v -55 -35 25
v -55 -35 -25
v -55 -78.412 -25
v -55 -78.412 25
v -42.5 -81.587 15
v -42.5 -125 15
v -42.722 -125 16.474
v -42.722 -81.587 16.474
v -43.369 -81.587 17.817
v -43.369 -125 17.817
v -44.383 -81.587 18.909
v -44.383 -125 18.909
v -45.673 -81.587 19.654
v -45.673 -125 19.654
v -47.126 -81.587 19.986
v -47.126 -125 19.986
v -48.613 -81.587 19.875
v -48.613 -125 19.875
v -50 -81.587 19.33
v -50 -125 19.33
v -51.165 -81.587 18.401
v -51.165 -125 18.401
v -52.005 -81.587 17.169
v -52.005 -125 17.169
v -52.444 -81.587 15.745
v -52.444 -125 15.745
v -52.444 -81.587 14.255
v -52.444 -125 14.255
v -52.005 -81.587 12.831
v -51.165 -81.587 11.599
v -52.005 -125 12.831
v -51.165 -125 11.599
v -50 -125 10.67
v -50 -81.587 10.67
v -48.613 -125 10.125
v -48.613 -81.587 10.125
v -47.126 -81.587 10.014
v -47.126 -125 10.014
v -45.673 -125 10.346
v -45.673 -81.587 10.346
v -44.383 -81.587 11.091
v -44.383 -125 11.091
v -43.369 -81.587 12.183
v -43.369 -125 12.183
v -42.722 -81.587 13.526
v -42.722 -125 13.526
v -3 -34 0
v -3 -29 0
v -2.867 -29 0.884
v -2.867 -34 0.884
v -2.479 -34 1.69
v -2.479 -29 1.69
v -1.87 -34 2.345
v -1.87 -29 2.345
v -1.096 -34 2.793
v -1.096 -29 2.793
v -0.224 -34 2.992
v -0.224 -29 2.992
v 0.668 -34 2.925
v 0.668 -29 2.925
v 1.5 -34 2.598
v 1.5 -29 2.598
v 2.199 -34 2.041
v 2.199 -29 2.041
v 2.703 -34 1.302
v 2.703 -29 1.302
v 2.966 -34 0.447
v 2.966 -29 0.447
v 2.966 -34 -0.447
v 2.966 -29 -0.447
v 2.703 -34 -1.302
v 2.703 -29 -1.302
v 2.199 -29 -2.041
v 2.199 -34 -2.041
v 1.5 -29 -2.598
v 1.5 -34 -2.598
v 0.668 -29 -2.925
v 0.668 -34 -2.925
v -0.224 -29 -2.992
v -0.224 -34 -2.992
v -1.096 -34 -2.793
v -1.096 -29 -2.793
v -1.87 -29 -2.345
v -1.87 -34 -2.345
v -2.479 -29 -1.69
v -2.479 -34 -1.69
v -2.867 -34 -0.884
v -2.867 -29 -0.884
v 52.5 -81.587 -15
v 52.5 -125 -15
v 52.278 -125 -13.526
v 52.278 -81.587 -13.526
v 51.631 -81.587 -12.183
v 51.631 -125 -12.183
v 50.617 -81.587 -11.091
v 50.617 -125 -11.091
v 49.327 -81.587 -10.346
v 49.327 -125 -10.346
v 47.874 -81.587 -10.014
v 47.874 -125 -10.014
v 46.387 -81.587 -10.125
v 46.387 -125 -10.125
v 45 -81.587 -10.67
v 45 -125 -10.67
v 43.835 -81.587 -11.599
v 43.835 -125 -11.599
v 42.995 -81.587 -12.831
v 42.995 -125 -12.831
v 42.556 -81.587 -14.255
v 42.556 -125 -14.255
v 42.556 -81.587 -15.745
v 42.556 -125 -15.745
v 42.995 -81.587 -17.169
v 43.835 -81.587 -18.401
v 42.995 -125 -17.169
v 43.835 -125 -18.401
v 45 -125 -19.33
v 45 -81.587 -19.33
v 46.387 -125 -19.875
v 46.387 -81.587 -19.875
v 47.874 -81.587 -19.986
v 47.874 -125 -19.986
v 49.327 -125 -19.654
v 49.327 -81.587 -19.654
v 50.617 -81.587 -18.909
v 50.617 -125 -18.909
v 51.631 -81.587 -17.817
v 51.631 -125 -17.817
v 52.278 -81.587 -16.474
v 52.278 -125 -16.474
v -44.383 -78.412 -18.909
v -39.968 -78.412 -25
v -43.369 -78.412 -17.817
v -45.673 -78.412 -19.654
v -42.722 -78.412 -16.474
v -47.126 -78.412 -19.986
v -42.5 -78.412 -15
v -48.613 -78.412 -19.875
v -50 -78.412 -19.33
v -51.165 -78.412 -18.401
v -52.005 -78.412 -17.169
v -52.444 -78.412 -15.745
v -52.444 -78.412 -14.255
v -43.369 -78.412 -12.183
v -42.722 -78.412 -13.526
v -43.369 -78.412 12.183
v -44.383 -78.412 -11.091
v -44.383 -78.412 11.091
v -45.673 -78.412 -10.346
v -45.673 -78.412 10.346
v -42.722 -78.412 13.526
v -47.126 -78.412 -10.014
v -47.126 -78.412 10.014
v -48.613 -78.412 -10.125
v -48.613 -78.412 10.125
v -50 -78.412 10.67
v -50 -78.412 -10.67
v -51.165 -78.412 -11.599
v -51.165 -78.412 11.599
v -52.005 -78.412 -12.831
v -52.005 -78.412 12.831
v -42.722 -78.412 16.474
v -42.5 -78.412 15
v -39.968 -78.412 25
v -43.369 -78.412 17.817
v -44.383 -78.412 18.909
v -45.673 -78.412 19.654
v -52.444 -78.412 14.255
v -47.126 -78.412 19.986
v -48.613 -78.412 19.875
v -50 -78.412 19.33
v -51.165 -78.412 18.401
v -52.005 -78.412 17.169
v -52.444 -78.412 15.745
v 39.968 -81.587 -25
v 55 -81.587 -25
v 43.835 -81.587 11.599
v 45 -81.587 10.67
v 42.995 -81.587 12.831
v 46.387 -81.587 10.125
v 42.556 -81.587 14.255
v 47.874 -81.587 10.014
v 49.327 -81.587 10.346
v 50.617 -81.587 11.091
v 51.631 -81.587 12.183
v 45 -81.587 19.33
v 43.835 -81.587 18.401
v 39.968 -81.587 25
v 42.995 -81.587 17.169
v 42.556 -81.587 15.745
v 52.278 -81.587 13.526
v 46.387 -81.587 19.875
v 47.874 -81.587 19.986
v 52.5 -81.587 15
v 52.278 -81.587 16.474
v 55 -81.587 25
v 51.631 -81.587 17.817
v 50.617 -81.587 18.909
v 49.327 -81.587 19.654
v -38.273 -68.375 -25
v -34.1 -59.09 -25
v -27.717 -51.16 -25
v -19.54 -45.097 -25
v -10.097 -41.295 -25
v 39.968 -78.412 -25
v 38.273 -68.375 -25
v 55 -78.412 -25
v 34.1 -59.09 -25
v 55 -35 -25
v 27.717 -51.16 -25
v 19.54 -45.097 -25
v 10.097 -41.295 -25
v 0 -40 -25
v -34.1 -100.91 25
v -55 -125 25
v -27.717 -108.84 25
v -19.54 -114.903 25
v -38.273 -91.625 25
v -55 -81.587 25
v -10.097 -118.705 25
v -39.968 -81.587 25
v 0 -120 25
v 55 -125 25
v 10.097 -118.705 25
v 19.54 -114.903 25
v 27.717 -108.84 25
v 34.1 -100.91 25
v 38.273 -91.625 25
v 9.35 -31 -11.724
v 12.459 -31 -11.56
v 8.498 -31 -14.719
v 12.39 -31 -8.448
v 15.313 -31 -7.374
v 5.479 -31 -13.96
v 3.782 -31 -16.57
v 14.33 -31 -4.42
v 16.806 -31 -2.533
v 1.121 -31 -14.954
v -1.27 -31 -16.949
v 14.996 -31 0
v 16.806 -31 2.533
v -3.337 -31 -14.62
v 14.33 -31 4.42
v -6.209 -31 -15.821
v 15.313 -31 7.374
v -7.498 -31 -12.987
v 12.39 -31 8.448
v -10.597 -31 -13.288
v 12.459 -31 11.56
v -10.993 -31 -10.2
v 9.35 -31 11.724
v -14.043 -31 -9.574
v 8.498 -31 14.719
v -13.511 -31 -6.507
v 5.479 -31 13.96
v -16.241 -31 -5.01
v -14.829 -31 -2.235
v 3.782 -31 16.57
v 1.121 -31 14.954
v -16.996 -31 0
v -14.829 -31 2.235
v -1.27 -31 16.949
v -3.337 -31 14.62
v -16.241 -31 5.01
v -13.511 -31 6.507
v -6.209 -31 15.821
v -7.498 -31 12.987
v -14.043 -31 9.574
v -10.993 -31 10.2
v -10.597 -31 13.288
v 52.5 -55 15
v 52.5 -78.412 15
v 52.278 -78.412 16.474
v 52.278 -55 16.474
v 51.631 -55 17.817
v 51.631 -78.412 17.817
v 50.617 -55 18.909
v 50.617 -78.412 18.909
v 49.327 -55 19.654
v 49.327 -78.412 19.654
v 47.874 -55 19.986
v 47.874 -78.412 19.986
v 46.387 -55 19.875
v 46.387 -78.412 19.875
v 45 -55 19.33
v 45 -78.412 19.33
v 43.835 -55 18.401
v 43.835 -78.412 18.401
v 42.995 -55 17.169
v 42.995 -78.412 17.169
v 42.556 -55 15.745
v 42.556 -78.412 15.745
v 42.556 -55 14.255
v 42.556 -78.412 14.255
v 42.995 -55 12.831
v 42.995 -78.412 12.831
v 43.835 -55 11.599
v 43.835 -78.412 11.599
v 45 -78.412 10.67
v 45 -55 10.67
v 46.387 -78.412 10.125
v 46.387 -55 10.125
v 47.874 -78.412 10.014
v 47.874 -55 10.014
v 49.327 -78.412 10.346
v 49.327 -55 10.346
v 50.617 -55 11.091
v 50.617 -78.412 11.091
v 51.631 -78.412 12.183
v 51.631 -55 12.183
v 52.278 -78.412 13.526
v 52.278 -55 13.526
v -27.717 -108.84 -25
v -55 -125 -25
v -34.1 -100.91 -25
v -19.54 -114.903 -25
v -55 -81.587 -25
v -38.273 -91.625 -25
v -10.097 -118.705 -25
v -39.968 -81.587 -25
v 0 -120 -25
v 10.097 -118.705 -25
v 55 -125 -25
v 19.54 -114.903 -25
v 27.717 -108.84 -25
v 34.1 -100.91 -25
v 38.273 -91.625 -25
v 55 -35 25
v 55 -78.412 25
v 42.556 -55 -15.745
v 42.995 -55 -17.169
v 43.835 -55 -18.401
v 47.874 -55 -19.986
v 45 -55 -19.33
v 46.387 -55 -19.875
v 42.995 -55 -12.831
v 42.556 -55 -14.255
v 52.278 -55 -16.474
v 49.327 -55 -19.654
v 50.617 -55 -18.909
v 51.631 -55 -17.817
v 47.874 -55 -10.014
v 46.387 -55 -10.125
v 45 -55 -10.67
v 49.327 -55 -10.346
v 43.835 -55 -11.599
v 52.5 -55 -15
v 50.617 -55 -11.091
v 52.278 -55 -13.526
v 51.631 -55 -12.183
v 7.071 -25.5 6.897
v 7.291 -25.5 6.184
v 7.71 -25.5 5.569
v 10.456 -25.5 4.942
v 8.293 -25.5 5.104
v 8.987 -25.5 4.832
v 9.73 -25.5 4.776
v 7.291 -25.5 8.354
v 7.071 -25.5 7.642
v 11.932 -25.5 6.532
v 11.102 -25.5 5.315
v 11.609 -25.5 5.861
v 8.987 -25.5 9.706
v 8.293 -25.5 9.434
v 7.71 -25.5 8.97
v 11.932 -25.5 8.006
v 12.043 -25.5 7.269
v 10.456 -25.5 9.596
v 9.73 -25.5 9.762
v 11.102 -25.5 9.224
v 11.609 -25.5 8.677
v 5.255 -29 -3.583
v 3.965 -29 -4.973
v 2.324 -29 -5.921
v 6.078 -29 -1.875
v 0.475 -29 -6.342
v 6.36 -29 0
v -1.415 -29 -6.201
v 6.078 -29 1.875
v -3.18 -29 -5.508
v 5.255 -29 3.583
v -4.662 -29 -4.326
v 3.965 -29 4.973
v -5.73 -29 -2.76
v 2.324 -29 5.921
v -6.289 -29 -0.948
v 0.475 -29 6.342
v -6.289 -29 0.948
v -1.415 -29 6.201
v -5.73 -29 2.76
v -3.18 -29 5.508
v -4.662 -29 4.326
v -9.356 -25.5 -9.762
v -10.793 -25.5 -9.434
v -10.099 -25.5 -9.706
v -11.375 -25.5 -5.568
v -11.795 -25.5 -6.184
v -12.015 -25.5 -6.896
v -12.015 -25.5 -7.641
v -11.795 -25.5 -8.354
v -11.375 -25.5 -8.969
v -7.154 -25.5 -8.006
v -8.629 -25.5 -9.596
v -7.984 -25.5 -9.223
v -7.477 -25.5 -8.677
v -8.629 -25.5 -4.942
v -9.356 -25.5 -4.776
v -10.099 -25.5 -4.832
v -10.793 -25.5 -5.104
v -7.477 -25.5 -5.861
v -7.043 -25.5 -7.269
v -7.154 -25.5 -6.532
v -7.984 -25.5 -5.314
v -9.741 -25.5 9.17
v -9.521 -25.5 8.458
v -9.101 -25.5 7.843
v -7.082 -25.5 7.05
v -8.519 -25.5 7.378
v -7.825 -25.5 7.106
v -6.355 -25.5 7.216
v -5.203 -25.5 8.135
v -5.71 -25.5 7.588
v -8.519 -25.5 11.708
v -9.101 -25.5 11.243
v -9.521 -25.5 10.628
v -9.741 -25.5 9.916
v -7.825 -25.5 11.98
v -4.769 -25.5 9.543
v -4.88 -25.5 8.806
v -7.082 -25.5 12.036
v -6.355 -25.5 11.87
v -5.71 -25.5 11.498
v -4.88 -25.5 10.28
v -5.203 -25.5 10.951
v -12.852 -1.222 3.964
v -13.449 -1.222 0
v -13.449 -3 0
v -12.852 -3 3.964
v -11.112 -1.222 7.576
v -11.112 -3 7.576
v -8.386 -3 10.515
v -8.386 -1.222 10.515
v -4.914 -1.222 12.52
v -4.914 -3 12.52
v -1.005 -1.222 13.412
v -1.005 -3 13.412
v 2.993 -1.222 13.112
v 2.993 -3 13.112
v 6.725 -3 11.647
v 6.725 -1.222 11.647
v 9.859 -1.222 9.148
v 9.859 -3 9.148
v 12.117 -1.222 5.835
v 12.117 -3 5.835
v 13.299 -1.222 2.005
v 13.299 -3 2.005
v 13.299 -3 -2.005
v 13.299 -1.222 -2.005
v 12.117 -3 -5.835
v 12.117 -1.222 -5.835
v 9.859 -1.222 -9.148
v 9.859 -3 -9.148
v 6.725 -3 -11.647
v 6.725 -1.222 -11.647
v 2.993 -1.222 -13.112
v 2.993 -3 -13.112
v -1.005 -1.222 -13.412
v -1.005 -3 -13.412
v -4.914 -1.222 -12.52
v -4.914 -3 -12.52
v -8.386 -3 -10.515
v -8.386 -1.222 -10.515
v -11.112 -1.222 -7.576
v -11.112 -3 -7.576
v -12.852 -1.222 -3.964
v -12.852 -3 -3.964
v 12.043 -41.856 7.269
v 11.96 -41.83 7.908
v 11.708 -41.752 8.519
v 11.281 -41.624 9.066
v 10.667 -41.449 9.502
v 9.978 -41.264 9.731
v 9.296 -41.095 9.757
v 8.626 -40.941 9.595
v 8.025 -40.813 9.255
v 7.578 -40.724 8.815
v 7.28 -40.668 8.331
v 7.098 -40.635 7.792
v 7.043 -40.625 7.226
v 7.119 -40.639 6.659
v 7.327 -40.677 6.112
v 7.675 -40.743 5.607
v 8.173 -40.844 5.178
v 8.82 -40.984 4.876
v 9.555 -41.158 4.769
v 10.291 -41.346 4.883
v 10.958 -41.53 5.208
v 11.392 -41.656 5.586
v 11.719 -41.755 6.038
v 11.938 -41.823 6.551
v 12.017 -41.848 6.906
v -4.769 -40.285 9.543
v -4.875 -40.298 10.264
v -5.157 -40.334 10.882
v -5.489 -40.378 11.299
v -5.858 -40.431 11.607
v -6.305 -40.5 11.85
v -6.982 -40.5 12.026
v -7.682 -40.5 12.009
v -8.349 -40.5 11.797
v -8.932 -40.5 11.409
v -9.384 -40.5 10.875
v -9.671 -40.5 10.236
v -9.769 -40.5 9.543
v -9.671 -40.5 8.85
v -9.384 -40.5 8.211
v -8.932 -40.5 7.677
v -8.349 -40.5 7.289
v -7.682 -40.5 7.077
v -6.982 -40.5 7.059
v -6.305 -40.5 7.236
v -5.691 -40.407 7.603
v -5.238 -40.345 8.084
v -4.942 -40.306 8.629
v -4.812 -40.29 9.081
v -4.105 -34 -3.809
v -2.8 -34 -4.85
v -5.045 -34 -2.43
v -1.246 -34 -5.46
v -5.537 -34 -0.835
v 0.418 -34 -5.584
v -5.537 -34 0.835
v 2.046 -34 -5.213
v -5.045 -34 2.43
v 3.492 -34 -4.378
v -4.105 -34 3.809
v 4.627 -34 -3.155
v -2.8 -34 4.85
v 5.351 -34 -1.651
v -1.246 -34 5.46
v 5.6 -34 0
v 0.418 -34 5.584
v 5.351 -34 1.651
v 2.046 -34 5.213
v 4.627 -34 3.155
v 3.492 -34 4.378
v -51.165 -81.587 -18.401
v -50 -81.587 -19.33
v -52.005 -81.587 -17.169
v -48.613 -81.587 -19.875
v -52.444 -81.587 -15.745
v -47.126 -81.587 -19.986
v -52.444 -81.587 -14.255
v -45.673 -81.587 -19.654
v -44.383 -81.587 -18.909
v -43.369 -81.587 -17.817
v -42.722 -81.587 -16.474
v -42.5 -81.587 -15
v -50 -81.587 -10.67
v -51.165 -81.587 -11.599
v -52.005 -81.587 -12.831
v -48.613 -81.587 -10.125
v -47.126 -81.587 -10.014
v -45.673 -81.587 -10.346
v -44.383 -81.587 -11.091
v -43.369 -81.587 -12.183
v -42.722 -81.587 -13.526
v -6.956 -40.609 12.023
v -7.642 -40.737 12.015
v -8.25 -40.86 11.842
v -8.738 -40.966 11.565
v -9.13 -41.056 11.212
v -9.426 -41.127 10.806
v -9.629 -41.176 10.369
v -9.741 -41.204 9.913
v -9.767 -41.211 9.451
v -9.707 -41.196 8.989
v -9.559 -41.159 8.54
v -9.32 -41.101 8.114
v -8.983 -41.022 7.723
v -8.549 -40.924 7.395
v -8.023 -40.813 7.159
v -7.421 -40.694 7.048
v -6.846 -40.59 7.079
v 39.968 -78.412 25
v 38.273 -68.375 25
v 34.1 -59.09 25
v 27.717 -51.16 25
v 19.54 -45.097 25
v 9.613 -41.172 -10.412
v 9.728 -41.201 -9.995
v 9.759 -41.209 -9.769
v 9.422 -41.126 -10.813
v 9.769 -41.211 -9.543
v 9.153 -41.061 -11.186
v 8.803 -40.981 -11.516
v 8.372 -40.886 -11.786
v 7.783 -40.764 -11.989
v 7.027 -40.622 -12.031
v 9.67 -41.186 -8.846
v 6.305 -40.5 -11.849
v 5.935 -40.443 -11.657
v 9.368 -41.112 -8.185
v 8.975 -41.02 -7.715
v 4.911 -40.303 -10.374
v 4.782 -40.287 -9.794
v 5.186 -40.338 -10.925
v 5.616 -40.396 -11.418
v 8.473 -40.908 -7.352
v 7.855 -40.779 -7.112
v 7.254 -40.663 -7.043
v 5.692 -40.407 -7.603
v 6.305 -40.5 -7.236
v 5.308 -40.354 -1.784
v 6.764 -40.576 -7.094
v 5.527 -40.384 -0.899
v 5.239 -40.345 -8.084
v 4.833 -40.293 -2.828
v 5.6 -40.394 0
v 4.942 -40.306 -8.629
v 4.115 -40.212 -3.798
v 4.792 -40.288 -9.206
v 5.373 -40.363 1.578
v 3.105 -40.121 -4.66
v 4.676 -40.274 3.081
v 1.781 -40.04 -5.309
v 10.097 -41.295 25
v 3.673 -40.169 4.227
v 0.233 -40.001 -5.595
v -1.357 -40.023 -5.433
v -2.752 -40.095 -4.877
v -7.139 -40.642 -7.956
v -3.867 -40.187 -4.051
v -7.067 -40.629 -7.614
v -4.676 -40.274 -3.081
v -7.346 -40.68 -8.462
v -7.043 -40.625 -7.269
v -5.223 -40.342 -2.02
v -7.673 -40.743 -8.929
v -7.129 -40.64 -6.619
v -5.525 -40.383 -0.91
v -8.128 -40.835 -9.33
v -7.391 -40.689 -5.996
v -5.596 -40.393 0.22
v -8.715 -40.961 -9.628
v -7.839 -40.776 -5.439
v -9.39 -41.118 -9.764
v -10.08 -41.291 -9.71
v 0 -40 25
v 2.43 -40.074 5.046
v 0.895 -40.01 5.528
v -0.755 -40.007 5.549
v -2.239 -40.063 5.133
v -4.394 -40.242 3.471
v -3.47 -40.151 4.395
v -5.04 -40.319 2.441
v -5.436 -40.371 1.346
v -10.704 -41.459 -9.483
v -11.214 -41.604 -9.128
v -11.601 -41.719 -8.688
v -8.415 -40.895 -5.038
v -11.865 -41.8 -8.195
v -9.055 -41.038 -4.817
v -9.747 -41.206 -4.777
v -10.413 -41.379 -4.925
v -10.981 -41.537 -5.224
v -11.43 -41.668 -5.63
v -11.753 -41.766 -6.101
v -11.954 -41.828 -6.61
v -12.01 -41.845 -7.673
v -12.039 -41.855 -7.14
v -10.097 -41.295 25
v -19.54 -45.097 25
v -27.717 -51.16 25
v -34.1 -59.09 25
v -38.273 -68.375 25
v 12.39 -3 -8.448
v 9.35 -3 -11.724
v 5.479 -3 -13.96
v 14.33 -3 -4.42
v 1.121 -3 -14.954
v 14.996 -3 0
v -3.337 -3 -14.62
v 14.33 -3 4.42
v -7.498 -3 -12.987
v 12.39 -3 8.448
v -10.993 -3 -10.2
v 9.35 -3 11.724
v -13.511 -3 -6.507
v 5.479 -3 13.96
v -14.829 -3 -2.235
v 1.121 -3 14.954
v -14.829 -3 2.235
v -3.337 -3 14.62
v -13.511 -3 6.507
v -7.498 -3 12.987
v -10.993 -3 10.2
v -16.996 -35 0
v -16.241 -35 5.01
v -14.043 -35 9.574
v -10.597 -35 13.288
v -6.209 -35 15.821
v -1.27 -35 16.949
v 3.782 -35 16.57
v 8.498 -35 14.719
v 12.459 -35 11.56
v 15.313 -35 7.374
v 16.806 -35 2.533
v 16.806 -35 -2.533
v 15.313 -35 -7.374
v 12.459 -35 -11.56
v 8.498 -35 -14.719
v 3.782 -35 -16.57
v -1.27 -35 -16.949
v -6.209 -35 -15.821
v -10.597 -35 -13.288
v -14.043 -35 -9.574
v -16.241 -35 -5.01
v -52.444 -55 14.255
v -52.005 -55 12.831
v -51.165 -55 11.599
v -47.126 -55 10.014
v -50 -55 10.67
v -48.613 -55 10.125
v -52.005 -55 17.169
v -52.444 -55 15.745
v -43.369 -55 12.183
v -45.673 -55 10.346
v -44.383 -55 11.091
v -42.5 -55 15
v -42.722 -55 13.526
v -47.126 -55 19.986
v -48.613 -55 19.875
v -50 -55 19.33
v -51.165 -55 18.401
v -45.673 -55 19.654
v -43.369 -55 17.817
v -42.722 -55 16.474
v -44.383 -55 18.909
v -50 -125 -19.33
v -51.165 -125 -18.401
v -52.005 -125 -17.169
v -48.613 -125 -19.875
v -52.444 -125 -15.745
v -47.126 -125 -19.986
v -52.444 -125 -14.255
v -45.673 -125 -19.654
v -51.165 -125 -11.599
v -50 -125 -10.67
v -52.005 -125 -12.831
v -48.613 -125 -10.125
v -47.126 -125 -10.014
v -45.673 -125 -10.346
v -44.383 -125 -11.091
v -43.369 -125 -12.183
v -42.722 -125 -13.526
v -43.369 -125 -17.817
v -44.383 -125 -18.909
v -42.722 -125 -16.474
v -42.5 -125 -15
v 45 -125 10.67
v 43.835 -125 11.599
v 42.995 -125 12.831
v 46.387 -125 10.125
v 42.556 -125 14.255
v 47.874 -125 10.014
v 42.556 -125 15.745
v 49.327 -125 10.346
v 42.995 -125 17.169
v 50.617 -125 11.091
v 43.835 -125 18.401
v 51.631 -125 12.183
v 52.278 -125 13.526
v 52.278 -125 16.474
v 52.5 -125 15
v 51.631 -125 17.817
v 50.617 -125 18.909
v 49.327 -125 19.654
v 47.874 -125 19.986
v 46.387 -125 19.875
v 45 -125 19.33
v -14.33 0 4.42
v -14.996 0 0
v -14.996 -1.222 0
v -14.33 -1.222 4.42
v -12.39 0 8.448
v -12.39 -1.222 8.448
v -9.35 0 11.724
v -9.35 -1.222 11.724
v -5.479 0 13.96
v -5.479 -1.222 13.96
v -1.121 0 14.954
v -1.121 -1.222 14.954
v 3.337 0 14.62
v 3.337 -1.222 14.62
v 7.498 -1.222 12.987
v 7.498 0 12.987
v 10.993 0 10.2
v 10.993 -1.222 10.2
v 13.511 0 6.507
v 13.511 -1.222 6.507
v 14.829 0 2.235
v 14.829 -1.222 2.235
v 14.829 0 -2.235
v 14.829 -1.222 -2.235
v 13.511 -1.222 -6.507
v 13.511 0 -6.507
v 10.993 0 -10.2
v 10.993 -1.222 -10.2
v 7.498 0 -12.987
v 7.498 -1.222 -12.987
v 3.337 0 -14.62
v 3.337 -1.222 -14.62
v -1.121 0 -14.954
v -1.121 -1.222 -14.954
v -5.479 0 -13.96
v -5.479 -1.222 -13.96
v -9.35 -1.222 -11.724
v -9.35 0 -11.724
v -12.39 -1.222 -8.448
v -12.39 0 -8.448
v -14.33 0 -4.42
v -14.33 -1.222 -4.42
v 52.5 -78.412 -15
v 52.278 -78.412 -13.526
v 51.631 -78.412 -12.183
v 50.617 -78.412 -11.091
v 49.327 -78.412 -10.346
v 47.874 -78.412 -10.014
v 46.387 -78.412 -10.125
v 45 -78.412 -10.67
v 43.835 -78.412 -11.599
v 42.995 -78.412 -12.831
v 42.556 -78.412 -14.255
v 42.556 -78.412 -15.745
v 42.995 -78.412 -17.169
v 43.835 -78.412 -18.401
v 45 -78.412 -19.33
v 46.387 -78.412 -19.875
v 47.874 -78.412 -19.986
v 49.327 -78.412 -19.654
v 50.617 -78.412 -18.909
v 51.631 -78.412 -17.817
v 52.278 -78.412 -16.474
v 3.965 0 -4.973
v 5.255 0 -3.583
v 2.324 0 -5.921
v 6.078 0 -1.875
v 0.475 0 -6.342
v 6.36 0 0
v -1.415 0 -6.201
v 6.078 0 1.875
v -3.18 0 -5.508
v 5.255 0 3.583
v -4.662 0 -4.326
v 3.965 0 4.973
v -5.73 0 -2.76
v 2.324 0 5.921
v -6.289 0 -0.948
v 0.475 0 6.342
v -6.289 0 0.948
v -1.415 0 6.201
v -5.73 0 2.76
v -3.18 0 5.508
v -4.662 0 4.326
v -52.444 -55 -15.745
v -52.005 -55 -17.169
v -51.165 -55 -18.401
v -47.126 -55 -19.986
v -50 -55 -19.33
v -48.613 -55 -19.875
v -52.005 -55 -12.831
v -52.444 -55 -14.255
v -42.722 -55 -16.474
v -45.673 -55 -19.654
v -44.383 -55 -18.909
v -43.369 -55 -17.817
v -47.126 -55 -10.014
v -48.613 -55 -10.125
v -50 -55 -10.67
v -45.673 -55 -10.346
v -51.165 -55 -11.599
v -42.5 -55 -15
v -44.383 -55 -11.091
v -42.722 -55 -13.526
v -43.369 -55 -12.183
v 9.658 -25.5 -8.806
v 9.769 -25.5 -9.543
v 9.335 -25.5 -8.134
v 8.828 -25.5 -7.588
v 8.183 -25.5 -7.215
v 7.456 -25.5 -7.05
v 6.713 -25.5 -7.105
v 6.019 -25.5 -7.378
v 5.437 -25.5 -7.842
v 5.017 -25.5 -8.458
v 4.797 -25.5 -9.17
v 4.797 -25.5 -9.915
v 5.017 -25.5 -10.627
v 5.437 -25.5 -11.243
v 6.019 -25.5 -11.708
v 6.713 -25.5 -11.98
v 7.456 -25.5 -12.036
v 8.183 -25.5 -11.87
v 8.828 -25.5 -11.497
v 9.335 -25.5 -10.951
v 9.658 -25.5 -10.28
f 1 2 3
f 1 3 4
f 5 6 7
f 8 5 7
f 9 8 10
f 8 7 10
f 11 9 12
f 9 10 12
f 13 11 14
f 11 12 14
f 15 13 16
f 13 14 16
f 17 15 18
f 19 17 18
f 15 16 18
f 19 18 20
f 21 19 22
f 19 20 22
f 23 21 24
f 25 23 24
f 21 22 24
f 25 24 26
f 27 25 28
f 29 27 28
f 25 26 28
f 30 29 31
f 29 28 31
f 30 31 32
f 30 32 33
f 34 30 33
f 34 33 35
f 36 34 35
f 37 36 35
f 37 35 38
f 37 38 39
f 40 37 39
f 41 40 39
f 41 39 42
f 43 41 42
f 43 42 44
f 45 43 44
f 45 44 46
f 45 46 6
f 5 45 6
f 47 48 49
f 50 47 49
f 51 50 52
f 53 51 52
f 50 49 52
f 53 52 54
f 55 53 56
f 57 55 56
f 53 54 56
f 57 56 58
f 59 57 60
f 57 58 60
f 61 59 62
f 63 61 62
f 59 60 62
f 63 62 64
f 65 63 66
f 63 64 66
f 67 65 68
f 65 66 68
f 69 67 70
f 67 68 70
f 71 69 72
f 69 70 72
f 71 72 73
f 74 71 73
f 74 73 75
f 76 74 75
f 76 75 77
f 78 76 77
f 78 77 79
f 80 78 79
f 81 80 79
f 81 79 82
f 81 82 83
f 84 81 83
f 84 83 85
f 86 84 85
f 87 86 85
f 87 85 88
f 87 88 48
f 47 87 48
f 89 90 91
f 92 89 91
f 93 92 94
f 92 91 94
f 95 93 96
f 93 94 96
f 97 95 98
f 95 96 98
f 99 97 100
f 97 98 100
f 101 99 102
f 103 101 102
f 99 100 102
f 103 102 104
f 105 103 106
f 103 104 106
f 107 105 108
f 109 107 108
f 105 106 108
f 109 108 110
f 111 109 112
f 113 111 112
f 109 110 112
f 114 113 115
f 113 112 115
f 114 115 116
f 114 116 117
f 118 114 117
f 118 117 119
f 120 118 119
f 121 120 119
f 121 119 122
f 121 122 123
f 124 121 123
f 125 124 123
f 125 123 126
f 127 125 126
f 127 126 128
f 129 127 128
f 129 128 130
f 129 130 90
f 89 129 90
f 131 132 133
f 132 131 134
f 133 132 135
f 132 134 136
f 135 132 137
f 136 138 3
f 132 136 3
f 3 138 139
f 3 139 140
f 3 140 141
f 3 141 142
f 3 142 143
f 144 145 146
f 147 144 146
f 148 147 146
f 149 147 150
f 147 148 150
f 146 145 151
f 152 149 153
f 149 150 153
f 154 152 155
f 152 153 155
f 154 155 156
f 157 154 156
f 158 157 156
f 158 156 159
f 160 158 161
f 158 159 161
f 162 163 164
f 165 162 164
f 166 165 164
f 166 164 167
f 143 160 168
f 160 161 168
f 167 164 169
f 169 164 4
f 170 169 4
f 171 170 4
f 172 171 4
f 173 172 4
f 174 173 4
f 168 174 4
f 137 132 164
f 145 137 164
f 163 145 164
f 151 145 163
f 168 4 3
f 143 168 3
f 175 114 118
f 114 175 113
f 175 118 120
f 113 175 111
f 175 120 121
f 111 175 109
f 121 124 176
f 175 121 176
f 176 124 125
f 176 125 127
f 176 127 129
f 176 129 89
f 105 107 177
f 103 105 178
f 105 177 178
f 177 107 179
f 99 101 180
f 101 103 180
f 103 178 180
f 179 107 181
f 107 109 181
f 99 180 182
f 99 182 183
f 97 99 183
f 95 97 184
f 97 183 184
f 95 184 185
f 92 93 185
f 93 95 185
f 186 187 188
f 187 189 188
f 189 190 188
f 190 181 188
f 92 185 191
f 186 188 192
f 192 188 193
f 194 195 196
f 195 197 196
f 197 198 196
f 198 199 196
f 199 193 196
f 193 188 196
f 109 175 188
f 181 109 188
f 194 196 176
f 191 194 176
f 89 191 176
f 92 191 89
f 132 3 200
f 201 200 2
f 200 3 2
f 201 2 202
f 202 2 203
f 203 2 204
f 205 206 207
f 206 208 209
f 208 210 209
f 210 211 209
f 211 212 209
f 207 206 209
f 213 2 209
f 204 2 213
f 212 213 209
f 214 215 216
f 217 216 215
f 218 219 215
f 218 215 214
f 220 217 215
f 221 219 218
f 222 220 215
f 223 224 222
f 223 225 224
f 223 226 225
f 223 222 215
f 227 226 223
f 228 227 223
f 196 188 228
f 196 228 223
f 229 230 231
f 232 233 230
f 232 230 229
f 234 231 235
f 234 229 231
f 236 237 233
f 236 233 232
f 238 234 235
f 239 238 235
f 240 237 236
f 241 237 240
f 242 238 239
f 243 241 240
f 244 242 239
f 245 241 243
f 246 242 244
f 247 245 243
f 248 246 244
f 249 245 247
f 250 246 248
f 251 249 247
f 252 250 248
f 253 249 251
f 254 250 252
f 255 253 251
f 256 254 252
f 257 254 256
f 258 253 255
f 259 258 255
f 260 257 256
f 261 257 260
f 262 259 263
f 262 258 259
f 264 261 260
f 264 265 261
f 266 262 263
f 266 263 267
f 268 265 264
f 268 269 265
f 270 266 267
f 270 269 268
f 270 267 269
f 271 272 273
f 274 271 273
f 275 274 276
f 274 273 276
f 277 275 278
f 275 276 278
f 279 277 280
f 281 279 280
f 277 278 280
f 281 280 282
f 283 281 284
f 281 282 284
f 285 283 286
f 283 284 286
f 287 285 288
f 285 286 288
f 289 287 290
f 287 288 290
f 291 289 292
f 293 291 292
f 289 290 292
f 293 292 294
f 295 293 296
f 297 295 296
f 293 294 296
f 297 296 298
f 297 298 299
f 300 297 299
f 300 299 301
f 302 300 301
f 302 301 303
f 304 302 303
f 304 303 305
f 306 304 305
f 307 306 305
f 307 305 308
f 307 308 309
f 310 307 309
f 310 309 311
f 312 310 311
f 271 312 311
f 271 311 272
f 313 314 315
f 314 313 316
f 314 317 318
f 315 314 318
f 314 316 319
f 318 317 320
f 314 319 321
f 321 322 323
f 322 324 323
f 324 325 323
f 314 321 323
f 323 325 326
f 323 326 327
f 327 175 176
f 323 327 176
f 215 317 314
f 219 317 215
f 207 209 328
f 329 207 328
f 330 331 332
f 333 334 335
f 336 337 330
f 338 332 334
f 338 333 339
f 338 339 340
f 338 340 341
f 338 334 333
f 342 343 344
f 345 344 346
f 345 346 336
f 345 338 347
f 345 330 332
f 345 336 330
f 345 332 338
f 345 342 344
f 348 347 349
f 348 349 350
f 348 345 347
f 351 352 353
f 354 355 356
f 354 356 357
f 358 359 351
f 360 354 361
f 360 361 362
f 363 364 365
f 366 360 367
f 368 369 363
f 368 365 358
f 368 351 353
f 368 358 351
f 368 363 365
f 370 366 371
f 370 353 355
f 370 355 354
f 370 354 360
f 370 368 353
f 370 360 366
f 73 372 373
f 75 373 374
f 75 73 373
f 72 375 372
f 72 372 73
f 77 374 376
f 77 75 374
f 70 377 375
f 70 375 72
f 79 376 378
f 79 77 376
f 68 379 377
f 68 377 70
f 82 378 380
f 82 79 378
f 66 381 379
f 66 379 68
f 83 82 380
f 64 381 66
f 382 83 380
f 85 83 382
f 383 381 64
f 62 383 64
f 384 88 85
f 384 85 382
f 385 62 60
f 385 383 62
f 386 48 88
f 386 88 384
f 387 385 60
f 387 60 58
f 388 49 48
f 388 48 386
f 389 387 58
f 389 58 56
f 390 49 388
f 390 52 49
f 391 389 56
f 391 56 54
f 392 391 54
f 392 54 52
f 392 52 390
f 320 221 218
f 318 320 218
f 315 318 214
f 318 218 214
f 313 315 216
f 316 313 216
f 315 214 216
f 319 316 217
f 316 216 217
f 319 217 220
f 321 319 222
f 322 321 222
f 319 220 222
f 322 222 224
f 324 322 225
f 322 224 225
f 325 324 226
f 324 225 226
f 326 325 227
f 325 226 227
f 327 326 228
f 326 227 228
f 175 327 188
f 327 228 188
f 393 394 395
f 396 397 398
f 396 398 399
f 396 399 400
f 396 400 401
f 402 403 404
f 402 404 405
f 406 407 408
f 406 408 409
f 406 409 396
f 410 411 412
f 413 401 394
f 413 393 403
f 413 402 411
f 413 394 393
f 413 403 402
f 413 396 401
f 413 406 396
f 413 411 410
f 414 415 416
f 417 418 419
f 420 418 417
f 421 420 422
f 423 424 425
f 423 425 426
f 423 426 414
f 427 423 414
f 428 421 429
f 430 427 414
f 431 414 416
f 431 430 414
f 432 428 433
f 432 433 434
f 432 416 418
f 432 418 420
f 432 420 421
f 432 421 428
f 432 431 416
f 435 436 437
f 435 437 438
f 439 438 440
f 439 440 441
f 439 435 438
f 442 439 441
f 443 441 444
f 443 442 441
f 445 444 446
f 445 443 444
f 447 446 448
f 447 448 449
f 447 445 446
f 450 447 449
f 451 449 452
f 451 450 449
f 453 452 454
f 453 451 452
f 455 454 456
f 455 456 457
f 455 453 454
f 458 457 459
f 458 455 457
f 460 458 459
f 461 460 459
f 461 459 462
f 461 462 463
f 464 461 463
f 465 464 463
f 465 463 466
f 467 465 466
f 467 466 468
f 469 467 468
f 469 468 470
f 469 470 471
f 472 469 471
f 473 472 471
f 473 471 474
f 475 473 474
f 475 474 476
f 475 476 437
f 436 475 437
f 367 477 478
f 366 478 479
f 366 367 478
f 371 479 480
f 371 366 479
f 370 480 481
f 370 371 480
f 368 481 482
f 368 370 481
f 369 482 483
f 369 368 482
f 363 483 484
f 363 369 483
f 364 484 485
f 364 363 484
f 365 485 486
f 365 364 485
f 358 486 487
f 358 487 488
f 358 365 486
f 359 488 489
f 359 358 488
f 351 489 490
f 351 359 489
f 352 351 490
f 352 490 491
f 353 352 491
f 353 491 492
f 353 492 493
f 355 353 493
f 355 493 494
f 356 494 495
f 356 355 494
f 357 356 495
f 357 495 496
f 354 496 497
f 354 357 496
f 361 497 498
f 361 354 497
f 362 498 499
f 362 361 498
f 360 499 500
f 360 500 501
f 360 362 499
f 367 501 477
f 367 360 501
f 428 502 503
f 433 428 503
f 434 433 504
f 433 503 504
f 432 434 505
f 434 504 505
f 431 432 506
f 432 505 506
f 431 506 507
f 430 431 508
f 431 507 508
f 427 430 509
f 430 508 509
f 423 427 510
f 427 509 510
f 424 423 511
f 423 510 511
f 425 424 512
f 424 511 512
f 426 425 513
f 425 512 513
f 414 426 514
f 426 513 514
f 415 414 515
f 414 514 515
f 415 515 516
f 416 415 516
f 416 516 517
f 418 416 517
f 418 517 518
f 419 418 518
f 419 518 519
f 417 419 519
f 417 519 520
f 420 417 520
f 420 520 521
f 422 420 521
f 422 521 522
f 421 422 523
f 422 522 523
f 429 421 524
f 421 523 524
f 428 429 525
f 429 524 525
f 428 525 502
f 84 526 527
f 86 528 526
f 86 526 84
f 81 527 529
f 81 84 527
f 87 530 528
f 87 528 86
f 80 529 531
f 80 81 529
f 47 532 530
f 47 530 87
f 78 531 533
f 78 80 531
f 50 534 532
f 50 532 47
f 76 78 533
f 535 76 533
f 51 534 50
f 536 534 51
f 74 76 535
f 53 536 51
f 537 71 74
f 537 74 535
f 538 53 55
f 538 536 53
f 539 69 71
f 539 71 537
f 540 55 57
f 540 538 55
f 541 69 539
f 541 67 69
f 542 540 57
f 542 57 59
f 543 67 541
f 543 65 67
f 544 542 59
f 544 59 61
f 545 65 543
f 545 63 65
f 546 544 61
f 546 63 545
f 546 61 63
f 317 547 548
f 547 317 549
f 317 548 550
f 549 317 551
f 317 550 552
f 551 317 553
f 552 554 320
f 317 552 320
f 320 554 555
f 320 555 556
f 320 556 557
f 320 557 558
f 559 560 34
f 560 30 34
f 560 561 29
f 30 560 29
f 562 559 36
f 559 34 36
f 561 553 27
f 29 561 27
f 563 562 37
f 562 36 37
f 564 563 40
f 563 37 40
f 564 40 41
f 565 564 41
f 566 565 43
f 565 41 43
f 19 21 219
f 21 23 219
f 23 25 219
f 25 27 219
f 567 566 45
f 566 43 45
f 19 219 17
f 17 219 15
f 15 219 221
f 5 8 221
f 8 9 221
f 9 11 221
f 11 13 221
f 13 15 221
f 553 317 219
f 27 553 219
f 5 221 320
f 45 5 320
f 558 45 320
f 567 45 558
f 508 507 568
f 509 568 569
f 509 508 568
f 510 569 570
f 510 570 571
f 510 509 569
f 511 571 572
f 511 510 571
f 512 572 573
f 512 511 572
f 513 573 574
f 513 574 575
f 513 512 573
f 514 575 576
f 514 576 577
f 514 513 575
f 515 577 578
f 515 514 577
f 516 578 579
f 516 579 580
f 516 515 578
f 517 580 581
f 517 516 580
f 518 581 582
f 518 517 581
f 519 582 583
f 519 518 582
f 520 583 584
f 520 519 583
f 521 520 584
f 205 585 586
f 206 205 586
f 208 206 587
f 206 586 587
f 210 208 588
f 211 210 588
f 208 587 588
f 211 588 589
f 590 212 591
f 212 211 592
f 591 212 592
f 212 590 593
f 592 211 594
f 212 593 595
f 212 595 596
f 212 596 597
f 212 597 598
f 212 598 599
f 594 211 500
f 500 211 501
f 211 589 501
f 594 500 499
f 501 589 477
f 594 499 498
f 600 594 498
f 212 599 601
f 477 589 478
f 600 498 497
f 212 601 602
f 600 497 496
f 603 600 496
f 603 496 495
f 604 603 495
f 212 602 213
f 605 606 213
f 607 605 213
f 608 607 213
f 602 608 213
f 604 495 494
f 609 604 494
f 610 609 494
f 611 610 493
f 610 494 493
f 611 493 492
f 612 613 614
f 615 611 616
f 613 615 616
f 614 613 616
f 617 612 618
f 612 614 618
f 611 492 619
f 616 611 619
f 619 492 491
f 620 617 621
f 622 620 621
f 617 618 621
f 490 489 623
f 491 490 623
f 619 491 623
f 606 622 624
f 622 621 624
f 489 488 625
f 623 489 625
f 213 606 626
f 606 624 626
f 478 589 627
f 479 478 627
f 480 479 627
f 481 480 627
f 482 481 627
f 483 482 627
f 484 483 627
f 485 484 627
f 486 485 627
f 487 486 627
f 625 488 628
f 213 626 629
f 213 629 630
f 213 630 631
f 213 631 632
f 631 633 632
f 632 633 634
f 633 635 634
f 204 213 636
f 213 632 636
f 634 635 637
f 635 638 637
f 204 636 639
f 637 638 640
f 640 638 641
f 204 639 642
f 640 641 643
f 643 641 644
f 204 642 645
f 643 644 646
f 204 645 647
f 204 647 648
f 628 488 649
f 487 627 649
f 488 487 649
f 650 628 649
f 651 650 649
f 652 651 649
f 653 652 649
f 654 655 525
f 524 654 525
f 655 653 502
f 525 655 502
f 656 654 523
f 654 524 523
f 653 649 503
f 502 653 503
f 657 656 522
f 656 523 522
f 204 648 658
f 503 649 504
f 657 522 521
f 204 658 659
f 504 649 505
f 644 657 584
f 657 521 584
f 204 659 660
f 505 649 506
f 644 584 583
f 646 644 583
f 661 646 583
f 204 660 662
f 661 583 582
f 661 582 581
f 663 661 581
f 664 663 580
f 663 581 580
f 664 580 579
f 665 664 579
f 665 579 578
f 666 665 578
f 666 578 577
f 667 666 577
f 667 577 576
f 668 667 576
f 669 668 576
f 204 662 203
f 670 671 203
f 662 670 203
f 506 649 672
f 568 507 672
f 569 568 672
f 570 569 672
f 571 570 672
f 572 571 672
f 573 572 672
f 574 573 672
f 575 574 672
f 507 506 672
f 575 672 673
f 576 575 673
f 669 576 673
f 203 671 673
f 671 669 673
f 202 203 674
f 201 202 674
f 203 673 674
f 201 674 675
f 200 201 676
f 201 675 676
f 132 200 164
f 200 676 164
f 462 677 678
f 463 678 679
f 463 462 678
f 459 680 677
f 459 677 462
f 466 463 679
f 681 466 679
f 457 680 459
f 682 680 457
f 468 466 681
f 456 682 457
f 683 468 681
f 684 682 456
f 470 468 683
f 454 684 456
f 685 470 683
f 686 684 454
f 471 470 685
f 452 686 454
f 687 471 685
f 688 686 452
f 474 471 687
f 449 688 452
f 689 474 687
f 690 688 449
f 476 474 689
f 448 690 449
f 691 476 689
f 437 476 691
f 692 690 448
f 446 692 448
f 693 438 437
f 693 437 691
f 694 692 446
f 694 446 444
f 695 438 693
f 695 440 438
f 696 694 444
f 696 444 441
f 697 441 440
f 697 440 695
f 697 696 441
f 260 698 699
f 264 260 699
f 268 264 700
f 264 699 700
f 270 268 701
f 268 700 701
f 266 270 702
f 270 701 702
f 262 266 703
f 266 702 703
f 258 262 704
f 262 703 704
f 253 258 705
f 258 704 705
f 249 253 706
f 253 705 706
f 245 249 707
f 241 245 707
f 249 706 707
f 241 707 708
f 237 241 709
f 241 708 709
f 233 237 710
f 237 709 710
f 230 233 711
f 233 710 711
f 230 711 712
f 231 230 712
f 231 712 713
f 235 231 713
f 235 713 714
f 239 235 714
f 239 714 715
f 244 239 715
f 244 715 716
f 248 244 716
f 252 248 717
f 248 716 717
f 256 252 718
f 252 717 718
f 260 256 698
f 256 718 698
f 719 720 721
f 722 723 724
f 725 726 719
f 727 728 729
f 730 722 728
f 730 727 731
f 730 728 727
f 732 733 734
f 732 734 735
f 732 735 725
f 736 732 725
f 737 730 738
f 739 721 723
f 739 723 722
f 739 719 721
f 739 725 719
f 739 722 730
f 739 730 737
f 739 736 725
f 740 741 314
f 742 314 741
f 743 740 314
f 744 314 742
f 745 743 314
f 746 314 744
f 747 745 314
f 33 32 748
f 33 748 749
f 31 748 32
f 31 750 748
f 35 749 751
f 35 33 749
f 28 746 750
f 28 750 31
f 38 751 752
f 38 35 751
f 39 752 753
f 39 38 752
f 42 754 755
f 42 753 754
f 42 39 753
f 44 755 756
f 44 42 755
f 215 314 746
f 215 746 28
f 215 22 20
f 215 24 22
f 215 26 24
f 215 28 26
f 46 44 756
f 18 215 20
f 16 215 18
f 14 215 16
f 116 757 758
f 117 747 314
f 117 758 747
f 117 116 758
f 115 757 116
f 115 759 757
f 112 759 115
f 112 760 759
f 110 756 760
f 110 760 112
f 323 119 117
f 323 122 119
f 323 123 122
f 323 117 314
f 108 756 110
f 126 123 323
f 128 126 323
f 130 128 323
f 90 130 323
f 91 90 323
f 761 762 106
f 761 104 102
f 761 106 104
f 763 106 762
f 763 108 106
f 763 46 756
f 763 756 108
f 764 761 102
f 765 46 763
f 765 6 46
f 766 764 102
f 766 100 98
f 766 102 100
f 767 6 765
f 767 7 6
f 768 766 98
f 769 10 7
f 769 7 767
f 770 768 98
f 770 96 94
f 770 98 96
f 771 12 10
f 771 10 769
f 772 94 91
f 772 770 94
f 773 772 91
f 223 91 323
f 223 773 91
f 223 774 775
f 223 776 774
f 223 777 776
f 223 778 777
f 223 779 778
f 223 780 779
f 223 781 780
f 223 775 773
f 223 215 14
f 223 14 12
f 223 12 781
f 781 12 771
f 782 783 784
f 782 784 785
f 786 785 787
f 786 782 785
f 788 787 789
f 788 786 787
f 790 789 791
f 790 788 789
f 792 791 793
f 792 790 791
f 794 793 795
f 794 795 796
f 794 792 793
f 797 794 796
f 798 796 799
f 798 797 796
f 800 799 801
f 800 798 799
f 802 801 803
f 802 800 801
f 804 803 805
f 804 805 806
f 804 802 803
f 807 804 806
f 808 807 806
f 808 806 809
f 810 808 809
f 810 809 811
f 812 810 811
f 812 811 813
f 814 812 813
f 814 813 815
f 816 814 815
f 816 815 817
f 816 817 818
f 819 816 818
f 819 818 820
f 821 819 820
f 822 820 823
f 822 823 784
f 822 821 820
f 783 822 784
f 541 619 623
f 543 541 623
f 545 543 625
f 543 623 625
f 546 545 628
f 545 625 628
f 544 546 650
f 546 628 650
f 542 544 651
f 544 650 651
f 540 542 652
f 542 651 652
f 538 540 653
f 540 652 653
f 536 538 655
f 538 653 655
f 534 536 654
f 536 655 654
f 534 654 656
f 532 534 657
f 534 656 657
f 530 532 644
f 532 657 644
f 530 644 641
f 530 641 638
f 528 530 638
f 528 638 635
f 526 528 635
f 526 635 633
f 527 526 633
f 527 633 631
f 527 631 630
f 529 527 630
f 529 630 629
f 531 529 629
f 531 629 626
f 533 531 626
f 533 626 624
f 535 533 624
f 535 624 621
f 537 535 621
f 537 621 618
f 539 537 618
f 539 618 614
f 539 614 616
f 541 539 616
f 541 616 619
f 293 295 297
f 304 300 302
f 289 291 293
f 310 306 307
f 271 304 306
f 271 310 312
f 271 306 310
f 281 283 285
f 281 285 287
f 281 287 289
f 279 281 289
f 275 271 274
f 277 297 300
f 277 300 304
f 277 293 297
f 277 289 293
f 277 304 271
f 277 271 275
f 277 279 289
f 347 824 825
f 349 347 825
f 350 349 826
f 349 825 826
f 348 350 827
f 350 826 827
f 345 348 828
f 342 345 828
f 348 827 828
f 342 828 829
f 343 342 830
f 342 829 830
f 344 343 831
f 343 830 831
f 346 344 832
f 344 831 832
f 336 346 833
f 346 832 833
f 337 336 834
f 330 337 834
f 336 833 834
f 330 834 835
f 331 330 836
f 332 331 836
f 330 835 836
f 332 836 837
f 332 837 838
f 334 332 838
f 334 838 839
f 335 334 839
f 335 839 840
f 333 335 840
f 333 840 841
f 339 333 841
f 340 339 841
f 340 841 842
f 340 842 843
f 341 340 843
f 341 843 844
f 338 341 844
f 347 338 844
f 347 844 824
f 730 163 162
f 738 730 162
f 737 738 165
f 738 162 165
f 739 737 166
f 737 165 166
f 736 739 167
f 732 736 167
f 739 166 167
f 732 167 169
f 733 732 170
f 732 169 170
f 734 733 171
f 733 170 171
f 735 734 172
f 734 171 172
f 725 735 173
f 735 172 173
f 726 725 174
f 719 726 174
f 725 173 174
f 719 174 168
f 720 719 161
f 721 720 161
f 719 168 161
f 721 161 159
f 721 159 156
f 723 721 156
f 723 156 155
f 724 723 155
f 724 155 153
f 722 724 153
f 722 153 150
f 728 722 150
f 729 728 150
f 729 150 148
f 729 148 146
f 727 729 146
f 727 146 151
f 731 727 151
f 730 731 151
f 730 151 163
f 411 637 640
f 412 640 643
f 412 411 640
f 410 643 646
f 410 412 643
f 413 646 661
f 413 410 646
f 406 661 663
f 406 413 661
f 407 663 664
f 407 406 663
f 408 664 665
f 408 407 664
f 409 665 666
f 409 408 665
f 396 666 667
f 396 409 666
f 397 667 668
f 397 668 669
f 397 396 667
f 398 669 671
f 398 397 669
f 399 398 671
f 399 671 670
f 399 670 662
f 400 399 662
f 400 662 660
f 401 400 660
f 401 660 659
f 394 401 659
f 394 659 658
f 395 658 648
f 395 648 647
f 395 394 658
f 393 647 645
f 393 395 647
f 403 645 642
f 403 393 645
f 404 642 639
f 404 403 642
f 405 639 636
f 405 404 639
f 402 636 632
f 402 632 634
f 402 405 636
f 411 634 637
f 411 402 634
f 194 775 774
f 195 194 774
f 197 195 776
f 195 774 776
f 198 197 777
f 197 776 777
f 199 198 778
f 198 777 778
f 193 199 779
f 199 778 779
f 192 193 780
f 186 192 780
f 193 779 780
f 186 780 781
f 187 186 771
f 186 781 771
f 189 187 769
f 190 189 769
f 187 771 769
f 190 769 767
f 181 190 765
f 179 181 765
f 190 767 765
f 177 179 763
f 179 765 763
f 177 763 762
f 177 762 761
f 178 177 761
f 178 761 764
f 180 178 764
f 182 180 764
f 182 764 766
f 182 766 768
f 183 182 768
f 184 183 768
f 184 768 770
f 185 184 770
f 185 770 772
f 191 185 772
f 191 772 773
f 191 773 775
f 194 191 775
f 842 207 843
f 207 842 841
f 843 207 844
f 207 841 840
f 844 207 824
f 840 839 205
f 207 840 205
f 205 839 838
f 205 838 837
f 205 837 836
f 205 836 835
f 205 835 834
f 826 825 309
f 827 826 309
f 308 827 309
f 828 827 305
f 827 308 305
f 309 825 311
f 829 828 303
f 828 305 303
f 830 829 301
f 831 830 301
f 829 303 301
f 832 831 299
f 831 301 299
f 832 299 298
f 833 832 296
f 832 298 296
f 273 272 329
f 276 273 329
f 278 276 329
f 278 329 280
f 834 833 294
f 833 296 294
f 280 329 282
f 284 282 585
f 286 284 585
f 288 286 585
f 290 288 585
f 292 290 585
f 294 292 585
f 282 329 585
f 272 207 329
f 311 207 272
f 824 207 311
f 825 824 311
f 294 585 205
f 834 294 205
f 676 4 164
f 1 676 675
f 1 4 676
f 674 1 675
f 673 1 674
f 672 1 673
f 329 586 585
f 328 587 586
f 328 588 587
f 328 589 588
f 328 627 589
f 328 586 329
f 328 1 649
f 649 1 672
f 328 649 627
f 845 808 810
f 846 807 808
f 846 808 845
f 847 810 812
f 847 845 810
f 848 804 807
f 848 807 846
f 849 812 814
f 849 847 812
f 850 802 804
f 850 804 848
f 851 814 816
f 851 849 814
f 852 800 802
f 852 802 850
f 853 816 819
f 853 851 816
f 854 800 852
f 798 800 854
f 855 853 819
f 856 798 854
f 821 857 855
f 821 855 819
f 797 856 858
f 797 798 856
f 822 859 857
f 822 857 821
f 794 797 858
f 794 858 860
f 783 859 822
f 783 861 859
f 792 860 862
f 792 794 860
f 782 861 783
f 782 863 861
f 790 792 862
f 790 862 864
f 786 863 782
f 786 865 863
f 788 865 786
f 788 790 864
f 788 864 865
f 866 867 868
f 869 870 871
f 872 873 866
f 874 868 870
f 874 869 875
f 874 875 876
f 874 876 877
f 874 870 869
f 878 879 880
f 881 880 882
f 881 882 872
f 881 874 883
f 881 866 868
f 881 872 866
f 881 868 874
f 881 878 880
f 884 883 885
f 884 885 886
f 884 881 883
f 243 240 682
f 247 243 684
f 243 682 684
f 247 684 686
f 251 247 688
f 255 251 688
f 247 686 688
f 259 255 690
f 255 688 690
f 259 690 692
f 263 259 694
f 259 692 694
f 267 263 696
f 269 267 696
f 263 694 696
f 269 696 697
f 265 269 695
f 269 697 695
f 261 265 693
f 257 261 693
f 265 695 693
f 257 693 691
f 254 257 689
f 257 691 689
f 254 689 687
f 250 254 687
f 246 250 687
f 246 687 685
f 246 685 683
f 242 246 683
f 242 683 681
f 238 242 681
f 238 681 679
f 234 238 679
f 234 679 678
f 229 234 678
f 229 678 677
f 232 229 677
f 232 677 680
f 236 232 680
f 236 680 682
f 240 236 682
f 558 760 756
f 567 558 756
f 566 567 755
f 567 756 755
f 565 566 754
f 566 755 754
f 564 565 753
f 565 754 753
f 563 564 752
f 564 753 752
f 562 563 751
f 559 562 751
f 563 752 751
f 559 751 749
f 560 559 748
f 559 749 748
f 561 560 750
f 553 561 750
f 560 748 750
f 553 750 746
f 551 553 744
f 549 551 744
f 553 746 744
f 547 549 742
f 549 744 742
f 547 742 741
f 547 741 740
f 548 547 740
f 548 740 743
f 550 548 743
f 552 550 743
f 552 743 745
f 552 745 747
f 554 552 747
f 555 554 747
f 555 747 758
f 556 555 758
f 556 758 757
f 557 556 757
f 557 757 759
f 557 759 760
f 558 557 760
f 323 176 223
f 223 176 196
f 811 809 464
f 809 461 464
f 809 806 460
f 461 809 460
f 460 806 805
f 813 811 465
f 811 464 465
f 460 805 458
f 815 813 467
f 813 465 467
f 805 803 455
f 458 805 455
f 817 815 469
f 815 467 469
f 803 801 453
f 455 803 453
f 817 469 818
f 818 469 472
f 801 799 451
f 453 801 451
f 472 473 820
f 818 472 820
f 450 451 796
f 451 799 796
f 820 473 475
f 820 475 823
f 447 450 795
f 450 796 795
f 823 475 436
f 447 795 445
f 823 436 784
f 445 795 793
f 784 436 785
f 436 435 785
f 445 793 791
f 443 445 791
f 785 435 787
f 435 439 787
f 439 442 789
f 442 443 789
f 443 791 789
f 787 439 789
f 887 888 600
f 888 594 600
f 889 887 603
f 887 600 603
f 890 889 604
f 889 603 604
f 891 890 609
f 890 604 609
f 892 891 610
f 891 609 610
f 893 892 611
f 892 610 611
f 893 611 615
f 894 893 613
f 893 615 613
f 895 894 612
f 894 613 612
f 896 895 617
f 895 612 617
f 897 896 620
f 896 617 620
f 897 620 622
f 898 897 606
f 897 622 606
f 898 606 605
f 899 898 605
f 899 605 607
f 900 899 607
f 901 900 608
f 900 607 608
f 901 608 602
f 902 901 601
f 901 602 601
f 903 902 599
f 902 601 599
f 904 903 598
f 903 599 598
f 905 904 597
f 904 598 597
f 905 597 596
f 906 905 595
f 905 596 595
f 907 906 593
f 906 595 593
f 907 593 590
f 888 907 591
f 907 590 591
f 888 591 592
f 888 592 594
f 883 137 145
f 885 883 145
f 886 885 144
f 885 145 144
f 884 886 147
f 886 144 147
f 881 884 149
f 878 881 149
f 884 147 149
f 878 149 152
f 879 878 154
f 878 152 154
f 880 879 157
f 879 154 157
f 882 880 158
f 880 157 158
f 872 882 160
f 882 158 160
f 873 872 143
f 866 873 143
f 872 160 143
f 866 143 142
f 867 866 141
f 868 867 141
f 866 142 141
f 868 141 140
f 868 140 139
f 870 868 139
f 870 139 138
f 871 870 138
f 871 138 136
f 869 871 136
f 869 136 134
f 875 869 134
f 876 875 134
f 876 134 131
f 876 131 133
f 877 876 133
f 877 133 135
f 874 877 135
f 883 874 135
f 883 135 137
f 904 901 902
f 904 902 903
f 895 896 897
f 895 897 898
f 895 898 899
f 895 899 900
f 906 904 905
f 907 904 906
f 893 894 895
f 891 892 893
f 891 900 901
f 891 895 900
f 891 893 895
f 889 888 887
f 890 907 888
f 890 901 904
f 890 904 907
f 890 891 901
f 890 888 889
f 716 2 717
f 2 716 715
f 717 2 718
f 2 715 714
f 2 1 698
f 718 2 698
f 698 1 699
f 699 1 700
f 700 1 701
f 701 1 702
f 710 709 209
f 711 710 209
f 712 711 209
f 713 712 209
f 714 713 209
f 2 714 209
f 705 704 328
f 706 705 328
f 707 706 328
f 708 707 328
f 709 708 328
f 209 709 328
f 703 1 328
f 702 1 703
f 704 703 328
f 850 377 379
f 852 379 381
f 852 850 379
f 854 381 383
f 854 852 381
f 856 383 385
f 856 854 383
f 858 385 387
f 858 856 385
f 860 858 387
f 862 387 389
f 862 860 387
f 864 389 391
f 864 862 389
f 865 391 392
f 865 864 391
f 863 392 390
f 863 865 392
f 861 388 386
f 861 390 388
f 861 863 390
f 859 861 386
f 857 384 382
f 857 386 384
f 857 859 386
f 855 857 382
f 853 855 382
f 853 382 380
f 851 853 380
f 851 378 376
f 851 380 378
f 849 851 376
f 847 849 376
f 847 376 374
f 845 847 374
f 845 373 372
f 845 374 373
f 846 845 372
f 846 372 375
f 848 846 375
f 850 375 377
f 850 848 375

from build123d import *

# Parameters (mm, degrees)
F0_R           = 14.99619
F0_R_2         = 6.36016
F1_DEPTH       = 35
F2_W           = 110
F2_H           = 50
F3_DEPTH       = 90
F4_R           = 5
F5_DEPTH       = 70
F7_DEPTH       = 50.001
F8_R           = 14.99619
F8_R_2         = 13.4493
F9_DEPTH       = 3
F10_R          = 14.99619
F10_R_2        = 13.4493
F11_DEPTH      = 1.22174
F12_R          = 16.99619
F12_R_2        = 14.99619
F13_DEPTH      = 4
F14_R          = 7.8345578302
F15_DEPTH      = 6
F16_R          = 3
F17_DEPTH      = 25
F19_R          = 5.6
F20_DEPTH      = 6.5
F19_R_2        = 2.5
F21_DEPTH      = 15
F21_DEPTH_BACK = 25


# Not quite as in the source:
# - a feature names something its author has since deleted; it is built from what else it names


with BuildPart() as f1:
    # F0 (on Front) → F1 (new body)
    with BuildSketch(Plane.XZ):
        Circle(F0_R)
        Circle(F0_R_2, mode=Mode.SUBTRACT)
    extrude(amount=F1_DEPTH)

    # F2 (on face) → F3 (join)
    with BuildSketch(Plane.XZ.offset(35)):
        Rectangle(F2_W, F2_H)
    extrude(amount=F3_DEPTH)

    # F4 (on face) → F5 (cut)
    with BuildSketch(Plane.XZ.offset(125)):
        with Locations((-47.5, 15)):
            Circle(F4_R)
        with Locations((-47.5, -15)):
            Circle(F4_R)
        with Locations((47.5, 15)):
            Circle(F4_R)
        with Locations((47.5, -15)):
            Circle(F4_R)
    extrude(amount=-F5_DEPTH, mode=Mode.SUBTRACT)

    # F6 (on face) → F7 (cut, through all)
    with BuildSketch(Plane.XY.offset(25)):
        with BuildLine():
            Line((-58.9964538813, -81.5874989), (-39.9684856761, -81.5874989))
            ThreePointArc((-39.9684856761, -81.5874989), (0, -120), (39.9684856761, -81.5874989))
            Line((39.9684856761, -81.5874989), (59.7361437976, -81.5874989))
            Line((59.7361437976, -81.5874989), (59.7361437976, -78.4124989))
            Line((59.7361437976, -78.4124989), (39.9684855887, -78.4124989))
            ThreePointArc((39.9684855887, -78.4124989), (0, -40), (-39.9684855887, -78.4124989))
            Line((-39.9684855887, -78.4124989), (-58.9964538813, -78.4124989))
            Line((-58.9964538813, -78.4124989), (-58.9964538813, -81.5874989))
        make_face()
    extrude(amount=-F7_DEPTH, mode=Mode.SUBTRACT)

    # F8 (on face) → F9 (cut)
    with BuildSketch(Plane(origin=(0, 0, 0), x_dir=(-1, 0, 0), z_dir=(0, 1, 0))):
        Circle(F8_R)
        Circle(F8_R_2, mode=Mode.SUBTRACT)
    extrude(amount=-F9_DEPTH, mode=Mode.SUBTRACT)

    # F10 (on face) → F11 (join)
    with BuildSketch(Plane(origin=(0, 0, 0), x_dir=(-1, 0, 0), z_dir=(0, 1, 0))):
        Circle(F10_R)
        Circle(F10_R_2, mode=Mode.SUBTRACT)
    extrude(amount=-F11_DEPTH)

    # F12 (on face) → F13 (join)
    with BuildSketch(Plane(origin=(0, -35, 0), x_dir=(-1, 0, 0), z_dir=(0, 1, 0))):
        Circle(F12_R)
        Circle(F12_R_2, mode=Mode.SUBTRACT)
    extrude(amount=F13_DEPTH)

    # F14 (on face) → F15 (join)
    with BuildSketch(Plane(origin=(0, -35, 0), x_dir=(-1, 0, 0), z_dir=(0, 1, 0))):
        Circle(F14_R)
    extrude(amount=F15_DEPTH)

    # F16 (on face) → F17 (cut)
    with BuildSketch(Plane(origin=(0, -29, 0), x_dir=(-1, 0, 0), z_dir=(0, 1, 0))):
        Circle(F16_R)
    extrude(amount=-F17_DEPTH, mode=Mode.SUBTRACT)

    # F19 (on offset) → F20 (cut)
    with BuildSketch(Plane.XZ.offset(40.5)):
        Circle(F19_R)
    extrude(amount=-F20_DEPTH, mode=Mode.SUBTRACT)

    # F19 (on offset) → F21 (cut, two sides)
    with BuildSketch(Plane.XZ.offset(40.5)) as f21_sk:
        with Locations((7.2691551531, -9.5426725713)):
            Circle(F19_R_2)
        with Locations((9.5429855552, 7.2691128213)):
            Circle(F19_R_2)
        with Locations((-7.2687998374, 9.5429432235)):
            Circle(F19_R_2)
        with Locations((-9.5426302396, -7.2688421692)):
            Circle(F19_R_2)
    extrude(amount=-F21_DEPTH, mode=Mode.SUBTRACT)
    extrude(f21_sk.sketch, amount=F21_DEPTH_BACK, mode=Mode.SUBTRACT)


solid = f1.part
